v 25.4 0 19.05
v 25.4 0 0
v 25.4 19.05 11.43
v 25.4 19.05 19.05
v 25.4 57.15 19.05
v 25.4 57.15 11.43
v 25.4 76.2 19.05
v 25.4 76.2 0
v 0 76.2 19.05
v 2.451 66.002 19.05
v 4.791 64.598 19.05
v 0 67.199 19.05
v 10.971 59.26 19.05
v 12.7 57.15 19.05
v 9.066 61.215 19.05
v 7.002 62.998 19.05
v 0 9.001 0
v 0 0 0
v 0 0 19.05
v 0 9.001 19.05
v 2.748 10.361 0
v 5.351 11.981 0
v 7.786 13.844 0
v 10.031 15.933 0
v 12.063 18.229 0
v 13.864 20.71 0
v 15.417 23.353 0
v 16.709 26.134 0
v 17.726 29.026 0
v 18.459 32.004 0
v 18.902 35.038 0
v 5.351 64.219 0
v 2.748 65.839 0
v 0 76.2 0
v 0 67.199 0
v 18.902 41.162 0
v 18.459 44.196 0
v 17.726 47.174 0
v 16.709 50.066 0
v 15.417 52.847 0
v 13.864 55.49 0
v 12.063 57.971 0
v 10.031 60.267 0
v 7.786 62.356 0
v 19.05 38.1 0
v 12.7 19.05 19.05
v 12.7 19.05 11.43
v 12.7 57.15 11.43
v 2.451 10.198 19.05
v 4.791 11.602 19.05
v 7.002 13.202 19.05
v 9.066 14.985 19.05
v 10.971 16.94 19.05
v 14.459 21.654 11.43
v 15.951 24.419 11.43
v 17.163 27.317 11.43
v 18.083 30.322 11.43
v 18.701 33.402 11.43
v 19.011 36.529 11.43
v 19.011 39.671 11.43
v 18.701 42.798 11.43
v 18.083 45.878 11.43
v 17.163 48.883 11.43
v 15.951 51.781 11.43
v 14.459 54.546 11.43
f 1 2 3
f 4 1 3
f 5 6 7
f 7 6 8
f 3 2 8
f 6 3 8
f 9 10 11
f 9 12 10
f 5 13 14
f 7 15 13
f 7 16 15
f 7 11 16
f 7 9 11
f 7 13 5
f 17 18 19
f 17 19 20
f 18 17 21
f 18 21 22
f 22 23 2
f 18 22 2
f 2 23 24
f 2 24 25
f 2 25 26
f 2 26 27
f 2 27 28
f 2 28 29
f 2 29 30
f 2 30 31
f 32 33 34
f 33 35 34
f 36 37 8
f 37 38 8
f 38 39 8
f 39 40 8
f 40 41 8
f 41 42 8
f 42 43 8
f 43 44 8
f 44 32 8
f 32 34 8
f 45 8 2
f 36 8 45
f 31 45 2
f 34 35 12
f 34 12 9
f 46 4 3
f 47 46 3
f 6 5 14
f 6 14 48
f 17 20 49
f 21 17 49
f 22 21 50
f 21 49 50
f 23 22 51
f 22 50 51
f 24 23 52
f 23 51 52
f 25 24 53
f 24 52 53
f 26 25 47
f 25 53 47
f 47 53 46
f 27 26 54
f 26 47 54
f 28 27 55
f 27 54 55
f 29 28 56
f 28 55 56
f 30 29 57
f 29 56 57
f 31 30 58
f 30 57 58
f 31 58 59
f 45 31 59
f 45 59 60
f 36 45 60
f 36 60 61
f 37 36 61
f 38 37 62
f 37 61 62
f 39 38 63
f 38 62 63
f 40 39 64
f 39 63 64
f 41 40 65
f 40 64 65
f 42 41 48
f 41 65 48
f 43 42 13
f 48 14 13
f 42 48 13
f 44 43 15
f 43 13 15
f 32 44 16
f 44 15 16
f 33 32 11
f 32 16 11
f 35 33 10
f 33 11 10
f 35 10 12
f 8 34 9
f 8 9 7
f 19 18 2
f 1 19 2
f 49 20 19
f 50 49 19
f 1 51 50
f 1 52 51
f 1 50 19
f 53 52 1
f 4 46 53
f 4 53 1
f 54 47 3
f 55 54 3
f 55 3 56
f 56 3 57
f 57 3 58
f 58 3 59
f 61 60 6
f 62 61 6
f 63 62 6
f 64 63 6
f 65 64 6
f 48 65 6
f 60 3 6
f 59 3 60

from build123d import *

# Parameters (mm, degrees)
SKETCH1_W           = 25.4
SKETCH1_H           = 76.2
BOSS_EXTRUDE1_DEPTH = 19.05
SKETCH2_R           = 31.75
CUT_EXTRUDE1_DEPTH  = 25.4
SKETCH4_W           = 7.62
SKETCH4_H           = 38.1
CUT_EXTRUDE3_DEPTH  = 26.4


with BuildPart() as part:
    # Sketch1 → Boss-Extrude1 (new body)
    with BuildSketch(Plane.XY):
        with Locations((12.7, 38.1)):
            Rectangle(SKETCH1_W, SKETCH1_H)
    extrude(amount=BOSS_EXTRUDE1_DEPTH)

    # Sketch2 → Cut-Extrude1 (cut)
    with BuildSketch(Plane.XY.offset(19.05)):
        with Locations((-12.7, 38.1)):
            Circle(SKETCH2_R)
    extrude(amount=-CUT_EXTRUDE1_DEPTH, mode=Mode.SUBTRACT)

    # Sketch4 → Cut-Extrude3 (cut, through all)
    with BuildSketch(Plane(origin=(25.4, 0, 0), x_dir=(0, 0, -1), z_dir=(1, 0, 0))):
        with Locations((-15.24, 38.1)):
            Rectangle(SKETCH4_W, SKETCH4_H)
    extrude(amount=-CUT_EXTRUDE3_DEPTH, mode=Mode.SUBTRACT)


solid = part.part
